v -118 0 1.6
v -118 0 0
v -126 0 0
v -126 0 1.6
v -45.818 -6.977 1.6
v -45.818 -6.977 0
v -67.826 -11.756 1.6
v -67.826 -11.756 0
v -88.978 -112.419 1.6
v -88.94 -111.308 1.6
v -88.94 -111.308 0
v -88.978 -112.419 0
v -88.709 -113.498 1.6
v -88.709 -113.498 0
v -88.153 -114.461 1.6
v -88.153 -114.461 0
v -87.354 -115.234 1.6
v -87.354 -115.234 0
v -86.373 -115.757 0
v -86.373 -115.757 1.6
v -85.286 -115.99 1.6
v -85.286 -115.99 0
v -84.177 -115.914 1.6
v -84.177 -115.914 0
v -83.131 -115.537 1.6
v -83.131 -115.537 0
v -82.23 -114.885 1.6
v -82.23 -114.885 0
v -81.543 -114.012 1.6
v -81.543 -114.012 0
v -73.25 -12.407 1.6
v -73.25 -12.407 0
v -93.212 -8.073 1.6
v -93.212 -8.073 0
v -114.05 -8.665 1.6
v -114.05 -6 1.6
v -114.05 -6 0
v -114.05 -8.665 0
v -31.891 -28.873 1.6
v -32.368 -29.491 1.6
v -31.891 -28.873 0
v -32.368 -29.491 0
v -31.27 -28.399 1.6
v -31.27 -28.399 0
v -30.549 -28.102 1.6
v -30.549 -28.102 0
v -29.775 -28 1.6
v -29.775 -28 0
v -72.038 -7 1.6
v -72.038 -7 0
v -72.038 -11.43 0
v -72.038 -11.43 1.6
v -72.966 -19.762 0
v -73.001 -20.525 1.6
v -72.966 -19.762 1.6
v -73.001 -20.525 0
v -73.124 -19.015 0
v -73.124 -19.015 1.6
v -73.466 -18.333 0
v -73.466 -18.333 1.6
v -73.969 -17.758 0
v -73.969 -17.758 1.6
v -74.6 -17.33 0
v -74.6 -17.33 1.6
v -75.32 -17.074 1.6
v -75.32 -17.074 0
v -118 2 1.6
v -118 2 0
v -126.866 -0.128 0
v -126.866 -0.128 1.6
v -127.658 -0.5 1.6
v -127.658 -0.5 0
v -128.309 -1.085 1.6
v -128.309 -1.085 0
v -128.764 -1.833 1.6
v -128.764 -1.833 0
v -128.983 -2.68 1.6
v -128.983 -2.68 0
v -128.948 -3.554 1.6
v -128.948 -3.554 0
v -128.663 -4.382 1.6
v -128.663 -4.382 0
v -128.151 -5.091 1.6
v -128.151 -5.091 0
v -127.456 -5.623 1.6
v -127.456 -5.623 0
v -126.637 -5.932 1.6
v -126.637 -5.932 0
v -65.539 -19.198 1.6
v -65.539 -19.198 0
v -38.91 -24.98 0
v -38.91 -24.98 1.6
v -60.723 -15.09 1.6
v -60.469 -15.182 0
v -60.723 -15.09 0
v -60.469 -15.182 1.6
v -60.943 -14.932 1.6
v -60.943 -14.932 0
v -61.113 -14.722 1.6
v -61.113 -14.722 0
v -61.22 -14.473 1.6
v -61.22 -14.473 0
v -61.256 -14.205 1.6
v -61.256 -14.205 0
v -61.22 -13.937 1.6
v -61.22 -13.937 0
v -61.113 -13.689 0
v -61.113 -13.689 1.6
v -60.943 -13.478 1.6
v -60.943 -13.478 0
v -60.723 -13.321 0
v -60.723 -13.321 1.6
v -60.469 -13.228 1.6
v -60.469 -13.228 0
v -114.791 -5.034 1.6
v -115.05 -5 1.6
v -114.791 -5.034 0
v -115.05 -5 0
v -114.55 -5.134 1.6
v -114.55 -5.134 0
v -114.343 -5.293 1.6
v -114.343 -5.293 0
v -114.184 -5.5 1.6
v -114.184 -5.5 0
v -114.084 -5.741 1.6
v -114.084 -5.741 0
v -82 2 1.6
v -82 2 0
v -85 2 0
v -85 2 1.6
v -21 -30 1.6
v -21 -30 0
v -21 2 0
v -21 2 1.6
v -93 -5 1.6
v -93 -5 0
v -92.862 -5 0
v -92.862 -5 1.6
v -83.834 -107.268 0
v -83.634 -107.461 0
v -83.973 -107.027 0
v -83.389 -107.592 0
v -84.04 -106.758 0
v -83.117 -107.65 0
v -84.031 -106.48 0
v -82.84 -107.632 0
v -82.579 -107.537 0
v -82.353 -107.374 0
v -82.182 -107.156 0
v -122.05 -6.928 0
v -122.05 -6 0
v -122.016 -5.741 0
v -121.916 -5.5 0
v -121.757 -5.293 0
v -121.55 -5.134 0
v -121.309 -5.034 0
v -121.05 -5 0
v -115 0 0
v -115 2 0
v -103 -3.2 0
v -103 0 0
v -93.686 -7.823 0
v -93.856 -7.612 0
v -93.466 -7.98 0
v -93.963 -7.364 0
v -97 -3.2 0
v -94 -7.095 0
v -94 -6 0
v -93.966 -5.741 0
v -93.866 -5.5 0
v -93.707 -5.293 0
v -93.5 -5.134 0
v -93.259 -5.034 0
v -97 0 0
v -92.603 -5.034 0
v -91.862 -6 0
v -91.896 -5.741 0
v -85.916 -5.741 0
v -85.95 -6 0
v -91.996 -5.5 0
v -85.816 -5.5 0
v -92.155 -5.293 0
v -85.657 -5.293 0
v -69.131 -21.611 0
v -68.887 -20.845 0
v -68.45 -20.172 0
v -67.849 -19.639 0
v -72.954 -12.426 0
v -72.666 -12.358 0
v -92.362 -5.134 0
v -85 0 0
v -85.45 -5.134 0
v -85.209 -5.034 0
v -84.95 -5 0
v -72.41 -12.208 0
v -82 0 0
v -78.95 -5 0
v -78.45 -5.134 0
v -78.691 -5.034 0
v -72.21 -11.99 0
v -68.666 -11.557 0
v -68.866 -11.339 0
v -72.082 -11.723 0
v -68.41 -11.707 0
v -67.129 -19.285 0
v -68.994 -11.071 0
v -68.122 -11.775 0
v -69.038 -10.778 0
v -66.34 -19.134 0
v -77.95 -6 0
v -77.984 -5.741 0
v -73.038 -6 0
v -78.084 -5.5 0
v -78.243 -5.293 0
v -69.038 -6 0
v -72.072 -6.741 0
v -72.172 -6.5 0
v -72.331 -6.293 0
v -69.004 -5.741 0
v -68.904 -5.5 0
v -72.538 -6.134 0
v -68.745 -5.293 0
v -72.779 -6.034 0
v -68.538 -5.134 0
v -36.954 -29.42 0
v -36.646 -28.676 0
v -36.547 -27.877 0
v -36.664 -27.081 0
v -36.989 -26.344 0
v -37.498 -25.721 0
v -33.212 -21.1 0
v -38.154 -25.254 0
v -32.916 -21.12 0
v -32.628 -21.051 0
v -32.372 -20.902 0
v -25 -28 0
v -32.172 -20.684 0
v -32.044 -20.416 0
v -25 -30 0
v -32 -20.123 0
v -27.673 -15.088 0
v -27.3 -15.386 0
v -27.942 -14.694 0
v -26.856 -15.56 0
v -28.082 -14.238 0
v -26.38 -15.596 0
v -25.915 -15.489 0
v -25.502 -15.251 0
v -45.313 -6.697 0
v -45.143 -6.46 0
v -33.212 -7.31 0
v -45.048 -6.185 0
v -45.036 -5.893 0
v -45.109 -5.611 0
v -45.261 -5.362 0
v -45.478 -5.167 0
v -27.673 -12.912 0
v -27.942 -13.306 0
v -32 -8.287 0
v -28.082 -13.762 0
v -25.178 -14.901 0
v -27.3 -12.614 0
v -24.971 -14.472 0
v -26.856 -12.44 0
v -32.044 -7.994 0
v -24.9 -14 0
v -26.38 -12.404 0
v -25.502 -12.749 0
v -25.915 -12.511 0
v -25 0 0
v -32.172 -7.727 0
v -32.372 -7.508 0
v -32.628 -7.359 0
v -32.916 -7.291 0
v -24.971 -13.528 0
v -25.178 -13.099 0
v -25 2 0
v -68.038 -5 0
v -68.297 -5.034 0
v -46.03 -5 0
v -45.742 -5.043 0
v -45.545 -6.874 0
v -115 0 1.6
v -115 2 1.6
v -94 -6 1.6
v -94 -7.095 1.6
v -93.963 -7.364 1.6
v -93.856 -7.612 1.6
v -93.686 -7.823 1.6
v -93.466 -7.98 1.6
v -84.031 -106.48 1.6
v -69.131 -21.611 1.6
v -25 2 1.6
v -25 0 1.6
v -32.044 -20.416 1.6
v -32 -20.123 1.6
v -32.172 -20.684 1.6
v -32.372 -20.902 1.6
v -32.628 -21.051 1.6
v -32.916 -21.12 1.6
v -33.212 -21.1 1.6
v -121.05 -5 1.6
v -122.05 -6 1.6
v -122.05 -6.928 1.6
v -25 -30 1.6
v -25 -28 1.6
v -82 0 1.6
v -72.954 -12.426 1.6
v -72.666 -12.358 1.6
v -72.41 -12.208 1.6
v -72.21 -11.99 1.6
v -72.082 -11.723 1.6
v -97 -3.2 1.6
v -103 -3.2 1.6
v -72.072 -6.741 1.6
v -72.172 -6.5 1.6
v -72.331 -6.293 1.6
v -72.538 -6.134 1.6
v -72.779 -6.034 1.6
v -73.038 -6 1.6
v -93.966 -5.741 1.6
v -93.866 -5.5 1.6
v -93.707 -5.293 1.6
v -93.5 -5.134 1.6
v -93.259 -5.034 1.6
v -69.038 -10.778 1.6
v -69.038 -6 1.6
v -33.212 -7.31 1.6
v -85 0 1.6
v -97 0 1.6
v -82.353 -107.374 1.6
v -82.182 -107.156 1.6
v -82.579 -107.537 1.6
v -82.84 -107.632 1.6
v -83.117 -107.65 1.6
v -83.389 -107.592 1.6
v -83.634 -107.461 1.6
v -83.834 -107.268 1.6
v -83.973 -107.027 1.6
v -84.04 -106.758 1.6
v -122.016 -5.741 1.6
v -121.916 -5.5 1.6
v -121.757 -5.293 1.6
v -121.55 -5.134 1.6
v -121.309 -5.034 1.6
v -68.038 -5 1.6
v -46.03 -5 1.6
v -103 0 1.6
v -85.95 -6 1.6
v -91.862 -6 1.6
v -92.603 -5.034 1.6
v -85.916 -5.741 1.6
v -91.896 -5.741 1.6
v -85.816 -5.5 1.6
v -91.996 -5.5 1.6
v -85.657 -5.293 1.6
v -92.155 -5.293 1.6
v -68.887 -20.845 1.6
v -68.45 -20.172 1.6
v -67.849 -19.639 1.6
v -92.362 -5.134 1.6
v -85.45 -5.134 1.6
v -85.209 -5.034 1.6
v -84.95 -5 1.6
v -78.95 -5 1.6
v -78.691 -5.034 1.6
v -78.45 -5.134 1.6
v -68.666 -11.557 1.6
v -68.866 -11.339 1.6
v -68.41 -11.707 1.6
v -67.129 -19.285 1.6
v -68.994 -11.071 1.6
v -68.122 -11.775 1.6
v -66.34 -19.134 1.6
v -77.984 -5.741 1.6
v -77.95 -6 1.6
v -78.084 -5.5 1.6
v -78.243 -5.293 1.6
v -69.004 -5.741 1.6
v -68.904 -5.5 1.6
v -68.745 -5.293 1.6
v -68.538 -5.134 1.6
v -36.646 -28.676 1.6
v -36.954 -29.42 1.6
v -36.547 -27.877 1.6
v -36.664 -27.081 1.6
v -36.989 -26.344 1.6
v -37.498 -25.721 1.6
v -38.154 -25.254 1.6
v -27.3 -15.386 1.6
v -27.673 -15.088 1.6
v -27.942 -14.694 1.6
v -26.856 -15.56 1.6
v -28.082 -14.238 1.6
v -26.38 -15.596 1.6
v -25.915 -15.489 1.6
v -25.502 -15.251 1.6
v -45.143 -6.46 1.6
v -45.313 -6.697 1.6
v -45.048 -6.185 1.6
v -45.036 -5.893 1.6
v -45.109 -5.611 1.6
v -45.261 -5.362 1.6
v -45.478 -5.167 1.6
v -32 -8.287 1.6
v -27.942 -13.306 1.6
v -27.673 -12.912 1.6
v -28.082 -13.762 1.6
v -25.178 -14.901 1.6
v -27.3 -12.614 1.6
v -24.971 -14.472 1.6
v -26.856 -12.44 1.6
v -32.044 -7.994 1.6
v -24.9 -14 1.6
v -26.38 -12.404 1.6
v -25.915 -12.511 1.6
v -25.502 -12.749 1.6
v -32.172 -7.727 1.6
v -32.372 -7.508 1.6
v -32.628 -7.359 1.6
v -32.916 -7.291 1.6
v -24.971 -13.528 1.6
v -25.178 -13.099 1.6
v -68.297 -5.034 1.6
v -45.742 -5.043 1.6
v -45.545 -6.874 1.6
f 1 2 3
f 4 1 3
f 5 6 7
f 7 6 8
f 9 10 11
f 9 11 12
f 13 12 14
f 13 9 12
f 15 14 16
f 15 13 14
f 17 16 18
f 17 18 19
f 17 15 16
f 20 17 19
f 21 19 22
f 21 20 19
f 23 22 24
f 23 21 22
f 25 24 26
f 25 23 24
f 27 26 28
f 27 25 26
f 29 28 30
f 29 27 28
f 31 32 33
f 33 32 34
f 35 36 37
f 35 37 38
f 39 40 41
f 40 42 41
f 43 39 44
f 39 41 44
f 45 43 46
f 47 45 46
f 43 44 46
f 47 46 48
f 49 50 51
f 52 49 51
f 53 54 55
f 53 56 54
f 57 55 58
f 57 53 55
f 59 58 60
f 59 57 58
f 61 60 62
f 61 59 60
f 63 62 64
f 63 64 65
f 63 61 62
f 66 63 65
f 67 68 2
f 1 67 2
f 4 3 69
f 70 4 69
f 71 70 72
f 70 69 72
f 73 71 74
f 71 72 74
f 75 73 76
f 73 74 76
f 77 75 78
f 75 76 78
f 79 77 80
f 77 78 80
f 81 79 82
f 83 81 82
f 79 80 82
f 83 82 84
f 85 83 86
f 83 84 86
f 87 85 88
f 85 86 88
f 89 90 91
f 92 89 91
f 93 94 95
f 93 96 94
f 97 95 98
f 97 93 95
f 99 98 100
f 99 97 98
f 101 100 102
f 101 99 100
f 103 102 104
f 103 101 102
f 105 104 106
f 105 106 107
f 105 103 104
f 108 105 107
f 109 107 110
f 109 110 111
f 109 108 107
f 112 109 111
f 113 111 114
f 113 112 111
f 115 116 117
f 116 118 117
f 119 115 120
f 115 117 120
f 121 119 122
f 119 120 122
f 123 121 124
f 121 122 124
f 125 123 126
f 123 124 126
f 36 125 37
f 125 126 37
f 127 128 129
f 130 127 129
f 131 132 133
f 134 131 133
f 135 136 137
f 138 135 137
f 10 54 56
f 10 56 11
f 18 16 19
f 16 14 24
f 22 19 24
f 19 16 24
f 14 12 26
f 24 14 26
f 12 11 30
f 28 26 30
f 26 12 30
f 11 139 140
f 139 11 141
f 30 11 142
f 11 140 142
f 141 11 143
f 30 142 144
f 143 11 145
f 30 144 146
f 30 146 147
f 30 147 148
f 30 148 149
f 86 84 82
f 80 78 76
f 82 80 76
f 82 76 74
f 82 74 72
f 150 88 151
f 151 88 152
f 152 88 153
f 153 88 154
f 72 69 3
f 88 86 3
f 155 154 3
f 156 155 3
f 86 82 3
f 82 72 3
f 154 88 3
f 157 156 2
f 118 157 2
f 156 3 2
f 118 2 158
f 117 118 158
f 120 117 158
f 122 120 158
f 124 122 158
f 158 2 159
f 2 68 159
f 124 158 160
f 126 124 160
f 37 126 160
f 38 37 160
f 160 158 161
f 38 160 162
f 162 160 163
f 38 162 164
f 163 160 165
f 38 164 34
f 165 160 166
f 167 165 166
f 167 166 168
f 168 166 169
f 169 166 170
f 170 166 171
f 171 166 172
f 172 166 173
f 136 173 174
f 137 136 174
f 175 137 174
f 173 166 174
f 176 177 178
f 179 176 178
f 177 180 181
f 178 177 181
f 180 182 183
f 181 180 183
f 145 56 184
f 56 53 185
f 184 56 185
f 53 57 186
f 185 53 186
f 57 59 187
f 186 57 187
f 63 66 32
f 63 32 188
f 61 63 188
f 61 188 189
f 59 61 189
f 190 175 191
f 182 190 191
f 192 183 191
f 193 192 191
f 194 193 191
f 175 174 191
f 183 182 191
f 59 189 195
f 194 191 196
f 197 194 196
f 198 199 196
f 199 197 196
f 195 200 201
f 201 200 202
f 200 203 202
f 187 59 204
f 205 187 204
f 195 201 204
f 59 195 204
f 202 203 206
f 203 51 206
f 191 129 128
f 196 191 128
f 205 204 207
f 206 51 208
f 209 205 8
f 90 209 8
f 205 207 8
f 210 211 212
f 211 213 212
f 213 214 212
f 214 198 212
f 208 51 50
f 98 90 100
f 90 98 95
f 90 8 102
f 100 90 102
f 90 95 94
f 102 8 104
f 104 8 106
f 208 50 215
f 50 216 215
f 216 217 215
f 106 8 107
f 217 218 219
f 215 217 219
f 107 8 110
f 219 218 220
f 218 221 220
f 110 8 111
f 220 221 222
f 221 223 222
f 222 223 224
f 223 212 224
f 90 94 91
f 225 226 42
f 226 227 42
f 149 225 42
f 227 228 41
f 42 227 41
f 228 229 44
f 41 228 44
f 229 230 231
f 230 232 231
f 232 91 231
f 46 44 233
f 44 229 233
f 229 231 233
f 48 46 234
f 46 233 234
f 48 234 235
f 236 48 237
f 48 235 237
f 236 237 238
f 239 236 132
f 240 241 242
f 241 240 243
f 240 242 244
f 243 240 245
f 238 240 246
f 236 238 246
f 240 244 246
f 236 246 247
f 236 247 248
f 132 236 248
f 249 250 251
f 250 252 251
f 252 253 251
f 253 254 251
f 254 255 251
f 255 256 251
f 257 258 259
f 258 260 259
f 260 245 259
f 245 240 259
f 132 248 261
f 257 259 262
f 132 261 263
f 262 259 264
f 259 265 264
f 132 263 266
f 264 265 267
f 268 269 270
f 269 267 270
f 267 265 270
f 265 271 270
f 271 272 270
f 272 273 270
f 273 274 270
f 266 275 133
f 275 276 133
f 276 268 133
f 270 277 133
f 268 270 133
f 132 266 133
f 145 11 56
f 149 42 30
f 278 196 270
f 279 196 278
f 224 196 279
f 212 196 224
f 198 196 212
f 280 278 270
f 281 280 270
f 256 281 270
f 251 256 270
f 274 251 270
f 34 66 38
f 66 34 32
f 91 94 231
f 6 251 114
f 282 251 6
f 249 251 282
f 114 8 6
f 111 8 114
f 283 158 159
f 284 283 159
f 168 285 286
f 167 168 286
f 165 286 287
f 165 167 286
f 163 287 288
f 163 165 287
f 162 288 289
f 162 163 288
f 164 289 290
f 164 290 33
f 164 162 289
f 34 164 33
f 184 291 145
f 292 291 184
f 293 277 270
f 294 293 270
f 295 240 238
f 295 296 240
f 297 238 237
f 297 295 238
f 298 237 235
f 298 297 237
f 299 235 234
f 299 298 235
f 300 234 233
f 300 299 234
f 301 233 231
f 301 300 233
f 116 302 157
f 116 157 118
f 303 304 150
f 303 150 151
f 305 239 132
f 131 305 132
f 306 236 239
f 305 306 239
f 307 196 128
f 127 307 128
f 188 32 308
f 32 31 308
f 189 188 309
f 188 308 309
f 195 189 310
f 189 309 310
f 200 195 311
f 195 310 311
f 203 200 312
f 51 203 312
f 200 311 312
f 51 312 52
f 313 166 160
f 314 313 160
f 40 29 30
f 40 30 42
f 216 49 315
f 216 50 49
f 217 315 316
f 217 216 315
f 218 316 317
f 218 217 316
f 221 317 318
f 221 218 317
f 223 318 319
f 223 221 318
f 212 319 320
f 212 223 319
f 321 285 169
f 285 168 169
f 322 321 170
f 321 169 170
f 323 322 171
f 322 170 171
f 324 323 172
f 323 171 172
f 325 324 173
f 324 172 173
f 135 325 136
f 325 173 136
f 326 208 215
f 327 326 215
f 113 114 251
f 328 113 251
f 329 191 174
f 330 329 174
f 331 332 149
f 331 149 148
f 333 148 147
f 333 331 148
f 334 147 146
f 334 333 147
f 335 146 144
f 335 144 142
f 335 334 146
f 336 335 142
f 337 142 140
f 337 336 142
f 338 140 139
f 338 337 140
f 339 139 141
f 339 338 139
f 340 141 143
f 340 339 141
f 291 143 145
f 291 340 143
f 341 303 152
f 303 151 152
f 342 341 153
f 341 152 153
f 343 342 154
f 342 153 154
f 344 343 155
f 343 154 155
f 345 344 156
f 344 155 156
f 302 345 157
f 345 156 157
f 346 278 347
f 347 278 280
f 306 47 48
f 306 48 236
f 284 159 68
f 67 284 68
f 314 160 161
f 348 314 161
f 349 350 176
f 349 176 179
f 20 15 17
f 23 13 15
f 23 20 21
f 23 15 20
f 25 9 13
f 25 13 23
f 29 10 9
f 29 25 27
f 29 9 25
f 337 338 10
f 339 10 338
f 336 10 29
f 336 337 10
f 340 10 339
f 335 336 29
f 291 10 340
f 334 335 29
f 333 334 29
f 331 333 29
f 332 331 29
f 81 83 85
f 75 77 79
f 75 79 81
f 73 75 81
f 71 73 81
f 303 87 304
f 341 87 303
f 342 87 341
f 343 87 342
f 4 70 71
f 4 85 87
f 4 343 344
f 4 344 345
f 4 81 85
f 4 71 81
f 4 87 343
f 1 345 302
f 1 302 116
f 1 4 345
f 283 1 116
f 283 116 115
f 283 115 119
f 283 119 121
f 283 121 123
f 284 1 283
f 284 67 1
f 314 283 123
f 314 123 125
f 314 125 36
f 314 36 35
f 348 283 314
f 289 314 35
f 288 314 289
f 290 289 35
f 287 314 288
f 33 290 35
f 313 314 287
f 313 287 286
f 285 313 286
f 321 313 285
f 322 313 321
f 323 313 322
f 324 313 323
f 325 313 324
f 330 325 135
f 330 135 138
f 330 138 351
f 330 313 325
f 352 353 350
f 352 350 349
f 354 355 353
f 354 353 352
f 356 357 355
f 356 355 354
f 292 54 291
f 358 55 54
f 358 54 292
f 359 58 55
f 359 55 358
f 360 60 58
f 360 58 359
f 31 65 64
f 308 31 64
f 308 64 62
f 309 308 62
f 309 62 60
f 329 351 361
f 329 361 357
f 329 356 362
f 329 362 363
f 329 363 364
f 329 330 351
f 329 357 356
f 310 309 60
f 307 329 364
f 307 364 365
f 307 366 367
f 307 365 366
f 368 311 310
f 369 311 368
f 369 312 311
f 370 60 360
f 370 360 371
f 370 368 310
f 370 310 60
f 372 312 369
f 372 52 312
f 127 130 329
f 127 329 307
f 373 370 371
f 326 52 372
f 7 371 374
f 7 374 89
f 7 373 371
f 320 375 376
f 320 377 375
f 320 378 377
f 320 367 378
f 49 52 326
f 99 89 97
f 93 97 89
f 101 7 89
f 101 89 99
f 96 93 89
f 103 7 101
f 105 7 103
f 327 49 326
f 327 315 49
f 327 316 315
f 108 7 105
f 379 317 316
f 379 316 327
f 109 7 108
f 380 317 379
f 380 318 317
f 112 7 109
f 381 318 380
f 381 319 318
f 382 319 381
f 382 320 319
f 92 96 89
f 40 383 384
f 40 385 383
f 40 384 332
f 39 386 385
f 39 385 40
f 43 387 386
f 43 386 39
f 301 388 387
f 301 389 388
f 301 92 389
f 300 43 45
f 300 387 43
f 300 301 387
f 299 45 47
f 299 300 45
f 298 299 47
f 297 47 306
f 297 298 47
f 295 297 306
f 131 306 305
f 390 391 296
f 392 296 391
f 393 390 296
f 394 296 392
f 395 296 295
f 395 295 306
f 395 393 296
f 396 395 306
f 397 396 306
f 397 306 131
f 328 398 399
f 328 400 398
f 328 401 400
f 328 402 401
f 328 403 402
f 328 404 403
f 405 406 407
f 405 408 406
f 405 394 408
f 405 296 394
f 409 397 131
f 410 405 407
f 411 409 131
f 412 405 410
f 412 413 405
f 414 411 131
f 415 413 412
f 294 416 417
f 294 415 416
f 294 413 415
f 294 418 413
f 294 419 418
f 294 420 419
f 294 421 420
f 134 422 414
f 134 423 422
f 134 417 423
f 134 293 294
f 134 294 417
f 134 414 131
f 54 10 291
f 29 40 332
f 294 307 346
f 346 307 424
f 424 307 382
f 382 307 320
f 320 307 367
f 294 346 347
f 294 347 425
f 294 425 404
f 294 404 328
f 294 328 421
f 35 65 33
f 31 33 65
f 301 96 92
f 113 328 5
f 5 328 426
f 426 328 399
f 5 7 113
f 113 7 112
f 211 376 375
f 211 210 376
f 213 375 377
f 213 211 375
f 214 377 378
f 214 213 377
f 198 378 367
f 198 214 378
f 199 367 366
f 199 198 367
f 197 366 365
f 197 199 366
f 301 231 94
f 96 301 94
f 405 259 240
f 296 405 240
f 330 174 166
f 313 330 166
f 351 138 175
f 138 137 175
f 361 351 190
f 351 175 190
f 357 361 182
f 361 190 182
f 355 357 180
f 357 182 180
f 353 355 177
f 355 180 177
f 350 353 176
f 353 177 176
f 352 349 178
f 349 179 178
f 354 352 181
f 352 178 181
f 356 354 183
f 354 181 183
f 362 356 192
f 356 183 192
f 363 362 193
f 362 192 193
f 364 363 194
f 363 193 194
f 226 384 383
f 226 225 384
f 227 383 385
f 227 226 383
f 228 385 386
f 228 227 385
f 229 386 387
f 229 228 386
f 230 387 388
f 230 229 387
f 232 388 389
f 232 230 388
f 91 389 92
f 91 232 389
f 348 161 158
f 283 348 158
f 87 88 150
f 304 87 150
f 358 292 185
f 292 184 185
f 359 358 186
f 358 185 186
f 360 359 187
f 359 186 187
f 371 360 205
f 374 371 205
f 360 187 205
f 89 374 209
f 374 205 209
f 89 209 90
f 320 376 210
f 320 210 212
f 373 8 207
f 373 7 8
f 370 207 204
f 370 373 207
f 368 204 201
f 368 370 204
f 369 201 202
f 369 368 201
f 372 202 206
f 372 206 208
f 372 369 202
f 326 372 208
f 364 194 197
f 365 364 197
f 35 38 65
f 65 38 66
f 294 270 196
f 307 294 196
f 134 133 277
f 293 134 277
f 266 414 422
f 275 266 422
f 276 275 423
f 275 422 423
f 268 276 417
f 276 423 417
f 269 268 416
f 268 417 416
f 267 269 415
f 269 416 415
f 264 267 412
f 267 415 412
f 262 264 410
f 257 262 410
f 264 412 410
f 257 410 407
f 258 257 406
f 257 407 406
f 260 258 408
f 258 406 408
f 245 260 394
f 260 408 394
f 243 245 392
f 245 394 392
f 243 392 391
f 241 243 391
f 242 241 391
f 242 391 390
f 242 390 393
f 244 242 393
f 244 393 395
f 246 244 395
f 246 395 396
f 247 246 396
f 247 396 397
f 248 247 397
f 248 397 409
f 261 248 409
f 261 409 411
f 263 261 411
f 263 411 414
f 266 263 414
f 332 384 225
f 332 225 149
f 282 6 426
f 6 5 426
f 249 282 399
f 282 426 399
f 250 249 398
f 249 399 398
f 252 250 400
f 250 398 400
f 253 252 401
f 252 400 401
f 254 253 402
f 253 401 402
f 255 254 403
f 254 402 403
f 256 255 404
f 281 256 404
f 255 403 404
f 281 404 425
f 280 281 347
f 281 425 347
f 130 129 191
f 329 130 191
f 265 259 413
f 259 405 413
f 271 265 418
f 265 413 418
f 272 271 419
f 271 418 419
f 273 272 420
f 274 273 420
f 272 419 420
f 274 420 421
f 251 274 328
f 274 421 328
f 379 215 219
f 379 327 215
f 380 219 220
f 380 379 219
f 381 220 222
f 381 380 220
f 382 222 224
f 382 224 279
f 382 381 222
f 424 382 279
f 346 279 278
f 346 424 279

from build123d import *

# Parameters (mm, degrees)
BOSS_EXTRUDE1_DEPTH = 1.6
CUT_EXTRUDE1_REACH  = 134.452
SKETCH3_W           = 5.911971619
SKETCH3_H           = 1
BOSS_EXTRUDE2_DEPTH = 1.6
BOSS_EXTRUDE3_DEPTH = 1.6
FILLET2_R           = 1
SKETCH6_R           = 1.6
CUT_EXTRUDE2_DEPTH  = 133.452104551
BOSS_EXTRUDE4_DEPTH = 1.6
FILLET3_R           = 3


with BuildPart() as part:
    # Sketch1 → Boss-Extrude1 (new body)
    with BuildSketch(Plane.XY):
        with BuildLine():
            Line((-25, 2), (-25, 0))
            Line((-25, 0), (-82, 0))
            Line((-82, 0), (-82, 2))
            Line((-82, 2), (-85, 2))
            Line((-85, 2), (-85, 0))
            Line((-85, 0), (-97, 0))
            Line((-97, 0), (-97, -3.2))
            Line((-97, -3.2), (-103, -3.2))
            Line((-103, -3.2), (-103, 0))
            Line((-103, 0), (-115, 0))
            Line((-115, 0), (-115, 2))
            Line((-115, 2), (-118, 2))
            Line((-118, 2), (-118, 0))
            Line((-118, 0), (-126, 0))
            ThreePointArc((-126, 0), (-128.982873168, -2.679894289), (-126.636556491, -5.931688223))
            Line((-126.636556491, -5.931688223), (-25, -28))
            Line((-25, -28), (-25, -30))
            Line((-25, -30), (-21, -30))
            Line((-21, -30), (-21, 2))
            Line((-21, 2), (-25, 2))
        make_face()
        Polygon((-32, -21.363586453), (-64.968742205, -14.205094401), (-32, -7.046602348), align=None, mode=Mode.SUBTRACT)
        Polygon((-69.038028381, -5), (-36.712857451, -5), (-69.038028381, -12.018753635), align=None, mode=Mode.SUBTRACT)
        Polygon((-72.038028381, -5), (-72.038028381, -12.67014264), (-107.363199311, -5), align=None, mode=Mode.SUBTRACT)
    extrude(amount=BOSS_EXTRUDE1_DEPTH)

    # Sketch2 → Cut-Extrude1 (cut, up to next)
    with BuildSketch(Plane.XY.offset(1.6), mode=Mode.PRIVATE) as cut_extrude1_sk1:
        Polygon((-122.05, -5), (-114.05, -5), (-114.05, -8.664603056), (-122.05, -6.927565711), align=None)
    cut_extrude1_tool1 = extrude(cut_extrude1_sk1.sketch, amount=-CUT_EXTRUDE1_REACH, mode=Mode.PRIVATE) & part.part
    add(cut_extrude1_tool1.solids().sort_by_distance((-117.635841, -6.443005, 1.6))[0], mode=Mode.SUBTRACT)

    # Sketch3 → Boss-Extrude2 (add)
    with BuildSketch(Plane.XY.offset(1.6)):
        with Locations((-74.99401419, -5.5)):
            Rectangle(SKETCH3_W, SKETCH3_H)
        with Locations((-88.90598581, -5.5)):
            Rectangle(SKETCH3_W, SKETCH3_H)
    extrude(amount=-BOSS_EXTRUDE2_DEPTH)

    # Sketch4 → Boss-Extrude3 (add)
    with BuildSketch(Plane.XY.offset(1.6)):
        Polygon((-107.363199311, -5), (-94, -5), (-94, -7.901547031), align=None)
    extrude(amount=-BOSS_EXTRUDE3_DEPTH)

    # Fillet2
    fillet2_edges = [part.edges().sort_by_distance(p)[0] for p in [
        (-64.968742205, -14.205094401, 0.8),
        (-69.038028381, -12.018753635, 0.8),
        (-72.038028381, -12.67014264, 0.8),
        (-69.038028381, -5, 0.8),
        (-36.712857451, -5, 0.8),
        (-32, -7.046602348, 0.8),
        (-32, -21.363586453, 0.8),
        (-122.05, -5, 0.8),
        (-114.05, -5, 0.8),
        (-85.95, -5, 0.8),
        (-77.95, -5, 0.8),
        (-72.038028381, -6, 0.8),
        (-91.861971619, -5, 0.8),
        (-94, -7.901547031, 0.8),
        (-94, -5, 0.8),
    ]]
    fillet(fillet2_edges, radius=FILLET2_R - 0.0001)  # a hair under: the kernel refuses the full size

    # Sketch6 → Cut-Extrude2 (cut, through all)
    with BuildSketch(Plane.XY.offset(1.6)):
        with Locations((-26.5, -14)):
            Circle(SKETCH6_R)
    extrude(amount=-CUT_EXTRUDE2_DEPTH, mode=Mode.SUBTRACT)

    # Sketch5 → Boss-Extrude4 (add)
    with BuildSketch(Plane.XY.offset(1.6)):
        with BuildLine():
            Line((-72.502917062, -17.685707385), (-88.939743507, -111.308320091))
            ThreePointArc((-88.939743507, -111.308320091), (-86.37296732, -115.756988254), (-81.542598068, -114.011559564))
            Line((-81.542598068, -114.011559564), (-31.5, -28))
            Line((-31.5, -28), (-25, -28))
            Line((-25, -28), (-34.87966647, -25.854831299))
            Line((-34.87966647, -25.854831299), (-82.18159936, -107.155826358))
            ThreePointArc((-82.18159936, -107.155826358), (-83.389191673, -107.59218353), (-84.03088572, -106.48001649))
            Line((-84.03088572, -106.48001649), (-68.590867503, -18.535129407))
            Line((-68.590867503, -18.535129407), (-72.502917062, -17.685707385))
        make_face()
    extrude(amount=-BOSS_EXTRUDE4_DEPTH)

    # Fillet3
    fillet3_edges = [part.edges().sort_by_distance(p)[0] for p in [
        (-72.502917062, -17.685707385, 0.8),
        (-68.590867503, -18.535129407, 0.8),
        (-34.87966647, -25.854831299, 0.8),
        (-31.5, -28, 0.8),
    ]]
    fillet(fillet3_edges, radius=FILLET3_R)


solid = part.part
